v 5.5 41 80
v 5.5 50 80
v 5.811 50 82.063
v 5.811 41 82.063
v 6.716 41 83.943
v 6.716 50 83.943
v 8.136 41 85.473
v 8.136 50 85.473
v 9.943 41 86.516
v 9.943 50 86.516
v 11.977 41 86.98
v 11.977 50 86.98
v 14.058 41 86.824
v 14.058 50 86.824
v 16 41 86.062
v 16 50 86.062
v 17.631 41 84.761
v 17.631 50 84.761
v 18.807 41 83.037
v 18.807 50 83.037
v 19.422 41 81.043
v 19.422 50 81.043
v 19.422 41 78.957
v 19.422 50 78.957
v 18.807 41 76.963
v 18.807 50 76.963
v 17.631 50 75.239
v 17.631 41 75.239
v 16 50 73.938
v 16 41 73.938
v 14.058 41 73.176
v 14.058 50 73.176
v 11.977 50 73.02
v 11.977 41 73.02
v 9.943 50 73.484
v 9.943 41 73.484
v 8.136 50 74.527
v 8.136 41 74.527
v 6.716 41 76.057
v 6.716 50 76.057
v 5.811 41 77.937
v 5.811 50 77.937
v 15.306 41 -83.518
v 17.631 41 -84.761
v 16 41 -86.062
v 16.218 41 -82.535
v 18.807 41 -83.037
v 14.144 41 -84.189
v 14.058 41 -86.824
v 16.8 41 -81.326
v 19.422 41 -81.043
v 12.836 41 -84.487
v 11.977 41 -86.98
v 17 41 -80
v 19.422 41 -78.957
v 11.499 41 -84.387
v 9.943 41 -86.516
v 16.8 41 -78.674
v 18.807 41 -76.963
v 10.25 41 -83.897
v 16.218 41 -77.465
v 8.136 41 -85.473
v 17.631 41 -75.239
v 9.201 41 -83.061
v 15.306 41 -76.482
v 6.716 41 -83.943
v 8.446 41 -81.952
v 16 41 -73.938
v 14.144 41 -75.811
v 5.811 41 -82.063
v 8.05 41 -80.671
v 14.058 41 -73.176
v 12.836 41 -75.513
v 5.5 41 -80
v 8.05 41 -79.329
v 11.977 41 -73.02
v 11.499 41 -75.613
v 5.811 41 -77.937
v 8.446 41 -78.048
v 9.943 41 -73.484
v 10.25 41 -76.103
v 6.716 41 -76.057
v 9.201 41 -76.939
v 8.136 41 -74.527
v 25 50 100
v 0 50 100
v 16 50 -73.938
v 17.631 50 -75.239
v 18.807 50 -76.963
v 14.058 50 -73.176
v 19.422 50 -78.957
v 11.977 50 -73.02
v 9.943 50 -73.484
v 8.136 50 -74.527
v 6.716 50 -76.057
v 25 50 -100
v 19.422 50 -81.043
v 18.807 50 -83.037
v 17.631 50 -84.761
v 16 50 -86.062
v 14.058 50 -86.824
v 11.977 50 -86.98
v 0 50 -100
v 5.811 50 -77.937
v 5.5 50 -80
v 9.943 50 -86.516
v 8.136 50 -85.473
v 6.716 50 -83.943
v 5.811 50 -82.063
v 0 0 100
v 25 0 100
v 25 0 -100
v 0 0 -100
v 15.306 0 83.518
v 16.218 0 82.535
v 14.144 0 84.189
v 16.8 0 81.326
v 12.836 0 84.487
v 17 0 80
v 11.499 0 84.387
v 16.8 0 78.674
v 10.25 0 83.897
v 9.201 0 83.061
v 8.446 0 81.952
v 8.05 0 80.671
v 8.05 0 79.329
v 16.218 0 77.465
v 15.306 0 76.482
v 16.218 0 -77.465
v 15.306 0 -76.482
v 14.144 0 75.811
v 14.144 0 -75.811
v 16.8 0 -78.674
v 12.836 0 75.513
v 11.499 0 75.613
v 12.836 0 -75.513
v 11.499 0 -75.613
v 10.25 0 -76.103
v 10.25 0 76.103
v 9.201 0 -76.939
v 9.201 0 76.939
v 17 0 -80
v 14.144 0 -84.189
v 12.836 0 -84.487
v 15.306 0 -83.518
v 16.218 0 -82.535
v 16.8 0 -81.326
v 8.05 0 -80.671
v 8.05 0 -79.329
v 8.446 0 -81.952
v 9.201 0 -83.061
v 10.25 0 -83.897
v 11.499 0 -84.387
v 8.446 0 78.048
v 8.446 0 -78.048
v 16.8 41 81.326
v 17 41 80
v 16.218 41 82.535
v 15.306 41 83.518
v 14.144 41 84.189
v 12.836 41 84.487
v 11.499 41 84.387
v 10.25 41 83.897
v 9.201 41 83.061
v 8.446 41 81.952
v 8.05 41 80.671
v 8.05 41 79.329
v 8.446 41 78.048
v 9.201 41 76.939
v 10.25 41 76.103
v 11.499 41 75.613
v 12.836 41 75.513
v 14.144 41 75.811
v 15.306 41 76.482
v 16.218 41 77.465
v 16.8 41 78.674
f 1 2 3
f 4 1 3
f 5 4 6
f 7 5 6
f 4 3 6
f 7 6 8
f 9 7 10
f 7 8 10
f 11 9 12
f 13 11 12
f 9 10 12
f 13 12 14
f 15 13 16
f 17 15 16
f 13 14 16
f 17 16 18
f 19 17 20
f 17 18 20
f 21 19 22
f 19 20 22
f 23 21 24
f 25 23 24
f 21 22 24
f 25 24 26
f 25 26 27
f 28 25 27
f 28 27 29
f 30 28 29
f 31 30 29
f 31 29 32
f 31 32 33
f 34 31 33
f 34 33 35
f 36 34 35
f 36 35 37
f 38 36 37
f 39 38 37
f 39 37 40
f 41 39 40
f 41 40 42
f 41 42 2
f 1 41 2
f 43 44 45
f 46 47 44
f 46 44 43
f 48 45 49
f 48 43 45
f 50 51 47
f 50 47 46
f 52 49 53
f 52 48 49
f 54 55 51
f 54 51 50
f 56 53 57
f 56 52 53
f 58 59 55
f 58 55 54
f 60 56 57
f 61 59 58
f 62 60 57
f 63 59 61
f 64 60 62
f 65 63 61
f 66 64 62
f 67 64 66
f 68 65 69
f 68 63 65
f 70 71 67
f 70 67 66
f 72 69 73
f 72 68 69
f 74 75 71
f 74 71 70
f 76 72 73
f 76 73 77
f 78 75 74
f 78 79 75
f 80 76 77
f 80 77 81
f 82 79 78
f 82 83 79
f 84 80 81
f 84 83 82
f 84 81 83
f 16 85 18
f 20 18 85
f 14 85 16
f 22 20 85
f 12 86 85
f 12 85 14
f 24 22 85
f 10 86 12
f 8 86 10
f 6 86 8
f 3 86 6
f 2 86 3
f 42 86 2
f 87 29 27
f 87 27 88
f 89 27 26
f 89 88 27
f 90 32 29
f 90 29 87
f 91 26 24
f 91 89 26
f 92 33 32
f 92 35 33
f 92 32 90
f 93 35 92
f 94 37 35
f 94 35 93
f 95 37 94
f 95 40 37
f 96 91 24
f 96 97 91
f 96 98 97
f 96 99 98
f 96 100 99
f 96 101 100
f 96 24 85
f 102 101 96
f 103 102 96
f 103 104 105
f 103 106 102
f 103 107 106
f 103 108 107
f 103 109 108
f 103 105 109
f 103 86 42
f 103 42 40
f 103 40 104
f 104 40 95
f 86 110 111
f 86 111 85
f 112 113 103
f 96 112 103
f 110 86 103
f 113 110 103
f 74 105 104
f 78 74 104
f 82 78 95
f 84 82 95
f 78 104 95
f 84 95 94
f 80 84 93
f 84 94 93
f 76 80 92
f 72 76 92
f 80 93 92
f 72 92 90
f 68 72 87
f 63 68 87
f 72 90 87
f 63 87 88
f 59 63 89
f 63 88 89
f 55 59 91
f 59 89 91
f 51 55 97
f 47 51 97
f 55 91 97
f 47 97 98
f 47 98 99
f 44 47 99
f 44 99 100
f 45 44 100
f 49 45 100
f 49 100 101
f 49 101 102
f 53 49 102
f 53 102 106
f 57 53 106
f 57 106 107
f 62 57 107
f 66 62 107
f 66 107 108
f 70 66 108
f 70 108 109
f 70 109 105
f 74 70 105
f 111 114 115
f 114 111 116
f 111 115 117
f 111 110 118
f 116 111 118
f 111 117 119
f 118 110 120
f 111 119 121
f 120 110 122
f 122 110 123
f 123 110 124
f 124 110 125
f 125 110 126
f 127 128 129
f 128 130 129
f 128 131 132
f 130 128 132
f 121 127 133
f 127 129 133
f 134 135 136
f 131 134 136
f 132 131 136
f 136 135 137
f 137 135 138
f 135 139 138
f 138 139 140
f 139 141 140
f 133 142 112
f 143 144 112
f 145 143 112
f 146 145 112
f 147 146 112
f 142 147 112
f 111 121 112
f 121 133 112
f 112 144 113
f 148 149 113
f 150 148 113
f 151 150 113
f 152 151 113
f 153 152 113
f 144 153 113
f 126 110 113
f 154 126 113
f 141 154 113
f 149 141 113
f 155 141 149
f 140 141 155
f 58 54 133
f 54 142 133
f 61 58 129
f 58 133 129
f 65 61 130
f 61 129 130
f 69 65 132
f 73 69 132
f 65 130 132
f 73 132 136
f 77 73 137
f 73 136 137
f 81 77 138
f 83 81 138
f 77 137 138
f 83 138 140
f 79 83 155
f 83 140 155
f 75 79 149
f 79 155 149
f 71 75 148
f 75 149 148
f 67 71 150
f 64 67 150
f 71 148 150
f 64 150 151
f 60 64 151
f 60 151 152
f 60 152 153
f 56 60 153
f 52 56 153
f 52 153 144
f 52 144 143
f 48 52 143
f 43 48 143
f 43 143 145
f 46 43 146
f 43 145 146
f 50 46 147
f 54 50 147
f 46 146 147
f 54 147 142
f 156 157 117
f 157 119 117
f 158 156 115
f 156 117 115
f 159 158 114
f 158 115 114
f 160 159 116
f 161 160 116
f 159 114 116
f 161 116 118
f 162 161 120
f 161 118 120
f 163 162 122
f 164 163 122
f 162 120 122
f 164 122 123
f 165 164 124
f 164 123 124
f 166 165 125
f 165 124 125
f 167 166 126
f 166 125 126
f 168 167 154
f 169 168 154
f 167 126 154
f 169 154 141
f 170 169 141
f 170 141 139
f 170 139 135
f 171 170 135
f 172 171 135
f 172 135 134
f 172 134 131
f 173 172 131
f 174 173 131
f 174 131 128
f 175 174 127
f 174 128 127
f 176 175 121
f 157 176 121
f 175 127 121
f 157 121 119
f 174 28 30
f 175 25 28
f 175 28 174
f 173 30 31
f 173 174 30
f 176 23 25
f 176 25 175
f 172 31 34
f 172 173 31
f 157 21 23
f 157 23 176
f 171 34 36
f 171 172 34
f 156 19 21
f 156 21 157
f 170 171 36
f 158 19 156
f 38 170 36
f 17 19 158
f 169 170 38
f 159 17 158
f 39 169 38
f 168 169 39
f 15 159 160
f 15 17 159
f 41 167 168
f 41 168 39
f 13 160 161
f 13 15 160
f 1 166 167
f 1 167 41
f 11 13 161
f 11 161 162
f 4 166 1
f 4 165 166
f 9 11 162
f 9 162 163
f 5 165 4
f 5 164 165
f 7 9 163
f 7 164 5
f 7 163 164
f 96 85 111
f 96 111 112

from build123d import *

# Parameters (mm, degrees)
SKETCH1_W                                       = 200
SKETCH1_H                                       = 50
BOSS_EXTRUDE1_DEPTH                             = 25
CBORE_FOR_M8_SOCKET_HEAD_CAP_SCREW1_D           = 9
CBORE_FOR_M8_SOCKET_HEAD_CAP_SCREW1_CBORE_D     = 14
CBORE_FOR_M8_SOCKET_HEAD_CAP_SCREW1_CBORE_DEPTH = 9


with BuildPart() as part:
    # Sketch1 → Boss-Extrude1 (new body)
    with BuildSketch(Plane(origin=(0, 0, 0), x_dir=(0, 0, -1), z_dir=(1, 0, 0))):
        with Locations((0, 25)):
            Rectangle(SKETCH1_W, SKETCH1_H)
    extrude(amount=BOSS_EXTRUDE1_DEPTH)

    # CBORE for M8 Socket Head Cap Screw1 (through all)
    with Locations(Plane(origin=(0, 50, 0), x_dir=(-1, 0, 0), z_dir=(0, 1, 0))):
        with Locations((-12.5, 80), (-12.5, -80)):
            CounterBoreHole(CBORE_FOR_M8_SOCKET_HEAD_CAP_SCREW1_D / 2, CBORE_FOR_M8_SOCKET_HEAD_CAP_SCREW1_CBORE_D / 2, CBORE_FOR_M8_SOCKET_HEAD_CAP_SCREW1_CBORE_DEPTH)


solid = part.part
